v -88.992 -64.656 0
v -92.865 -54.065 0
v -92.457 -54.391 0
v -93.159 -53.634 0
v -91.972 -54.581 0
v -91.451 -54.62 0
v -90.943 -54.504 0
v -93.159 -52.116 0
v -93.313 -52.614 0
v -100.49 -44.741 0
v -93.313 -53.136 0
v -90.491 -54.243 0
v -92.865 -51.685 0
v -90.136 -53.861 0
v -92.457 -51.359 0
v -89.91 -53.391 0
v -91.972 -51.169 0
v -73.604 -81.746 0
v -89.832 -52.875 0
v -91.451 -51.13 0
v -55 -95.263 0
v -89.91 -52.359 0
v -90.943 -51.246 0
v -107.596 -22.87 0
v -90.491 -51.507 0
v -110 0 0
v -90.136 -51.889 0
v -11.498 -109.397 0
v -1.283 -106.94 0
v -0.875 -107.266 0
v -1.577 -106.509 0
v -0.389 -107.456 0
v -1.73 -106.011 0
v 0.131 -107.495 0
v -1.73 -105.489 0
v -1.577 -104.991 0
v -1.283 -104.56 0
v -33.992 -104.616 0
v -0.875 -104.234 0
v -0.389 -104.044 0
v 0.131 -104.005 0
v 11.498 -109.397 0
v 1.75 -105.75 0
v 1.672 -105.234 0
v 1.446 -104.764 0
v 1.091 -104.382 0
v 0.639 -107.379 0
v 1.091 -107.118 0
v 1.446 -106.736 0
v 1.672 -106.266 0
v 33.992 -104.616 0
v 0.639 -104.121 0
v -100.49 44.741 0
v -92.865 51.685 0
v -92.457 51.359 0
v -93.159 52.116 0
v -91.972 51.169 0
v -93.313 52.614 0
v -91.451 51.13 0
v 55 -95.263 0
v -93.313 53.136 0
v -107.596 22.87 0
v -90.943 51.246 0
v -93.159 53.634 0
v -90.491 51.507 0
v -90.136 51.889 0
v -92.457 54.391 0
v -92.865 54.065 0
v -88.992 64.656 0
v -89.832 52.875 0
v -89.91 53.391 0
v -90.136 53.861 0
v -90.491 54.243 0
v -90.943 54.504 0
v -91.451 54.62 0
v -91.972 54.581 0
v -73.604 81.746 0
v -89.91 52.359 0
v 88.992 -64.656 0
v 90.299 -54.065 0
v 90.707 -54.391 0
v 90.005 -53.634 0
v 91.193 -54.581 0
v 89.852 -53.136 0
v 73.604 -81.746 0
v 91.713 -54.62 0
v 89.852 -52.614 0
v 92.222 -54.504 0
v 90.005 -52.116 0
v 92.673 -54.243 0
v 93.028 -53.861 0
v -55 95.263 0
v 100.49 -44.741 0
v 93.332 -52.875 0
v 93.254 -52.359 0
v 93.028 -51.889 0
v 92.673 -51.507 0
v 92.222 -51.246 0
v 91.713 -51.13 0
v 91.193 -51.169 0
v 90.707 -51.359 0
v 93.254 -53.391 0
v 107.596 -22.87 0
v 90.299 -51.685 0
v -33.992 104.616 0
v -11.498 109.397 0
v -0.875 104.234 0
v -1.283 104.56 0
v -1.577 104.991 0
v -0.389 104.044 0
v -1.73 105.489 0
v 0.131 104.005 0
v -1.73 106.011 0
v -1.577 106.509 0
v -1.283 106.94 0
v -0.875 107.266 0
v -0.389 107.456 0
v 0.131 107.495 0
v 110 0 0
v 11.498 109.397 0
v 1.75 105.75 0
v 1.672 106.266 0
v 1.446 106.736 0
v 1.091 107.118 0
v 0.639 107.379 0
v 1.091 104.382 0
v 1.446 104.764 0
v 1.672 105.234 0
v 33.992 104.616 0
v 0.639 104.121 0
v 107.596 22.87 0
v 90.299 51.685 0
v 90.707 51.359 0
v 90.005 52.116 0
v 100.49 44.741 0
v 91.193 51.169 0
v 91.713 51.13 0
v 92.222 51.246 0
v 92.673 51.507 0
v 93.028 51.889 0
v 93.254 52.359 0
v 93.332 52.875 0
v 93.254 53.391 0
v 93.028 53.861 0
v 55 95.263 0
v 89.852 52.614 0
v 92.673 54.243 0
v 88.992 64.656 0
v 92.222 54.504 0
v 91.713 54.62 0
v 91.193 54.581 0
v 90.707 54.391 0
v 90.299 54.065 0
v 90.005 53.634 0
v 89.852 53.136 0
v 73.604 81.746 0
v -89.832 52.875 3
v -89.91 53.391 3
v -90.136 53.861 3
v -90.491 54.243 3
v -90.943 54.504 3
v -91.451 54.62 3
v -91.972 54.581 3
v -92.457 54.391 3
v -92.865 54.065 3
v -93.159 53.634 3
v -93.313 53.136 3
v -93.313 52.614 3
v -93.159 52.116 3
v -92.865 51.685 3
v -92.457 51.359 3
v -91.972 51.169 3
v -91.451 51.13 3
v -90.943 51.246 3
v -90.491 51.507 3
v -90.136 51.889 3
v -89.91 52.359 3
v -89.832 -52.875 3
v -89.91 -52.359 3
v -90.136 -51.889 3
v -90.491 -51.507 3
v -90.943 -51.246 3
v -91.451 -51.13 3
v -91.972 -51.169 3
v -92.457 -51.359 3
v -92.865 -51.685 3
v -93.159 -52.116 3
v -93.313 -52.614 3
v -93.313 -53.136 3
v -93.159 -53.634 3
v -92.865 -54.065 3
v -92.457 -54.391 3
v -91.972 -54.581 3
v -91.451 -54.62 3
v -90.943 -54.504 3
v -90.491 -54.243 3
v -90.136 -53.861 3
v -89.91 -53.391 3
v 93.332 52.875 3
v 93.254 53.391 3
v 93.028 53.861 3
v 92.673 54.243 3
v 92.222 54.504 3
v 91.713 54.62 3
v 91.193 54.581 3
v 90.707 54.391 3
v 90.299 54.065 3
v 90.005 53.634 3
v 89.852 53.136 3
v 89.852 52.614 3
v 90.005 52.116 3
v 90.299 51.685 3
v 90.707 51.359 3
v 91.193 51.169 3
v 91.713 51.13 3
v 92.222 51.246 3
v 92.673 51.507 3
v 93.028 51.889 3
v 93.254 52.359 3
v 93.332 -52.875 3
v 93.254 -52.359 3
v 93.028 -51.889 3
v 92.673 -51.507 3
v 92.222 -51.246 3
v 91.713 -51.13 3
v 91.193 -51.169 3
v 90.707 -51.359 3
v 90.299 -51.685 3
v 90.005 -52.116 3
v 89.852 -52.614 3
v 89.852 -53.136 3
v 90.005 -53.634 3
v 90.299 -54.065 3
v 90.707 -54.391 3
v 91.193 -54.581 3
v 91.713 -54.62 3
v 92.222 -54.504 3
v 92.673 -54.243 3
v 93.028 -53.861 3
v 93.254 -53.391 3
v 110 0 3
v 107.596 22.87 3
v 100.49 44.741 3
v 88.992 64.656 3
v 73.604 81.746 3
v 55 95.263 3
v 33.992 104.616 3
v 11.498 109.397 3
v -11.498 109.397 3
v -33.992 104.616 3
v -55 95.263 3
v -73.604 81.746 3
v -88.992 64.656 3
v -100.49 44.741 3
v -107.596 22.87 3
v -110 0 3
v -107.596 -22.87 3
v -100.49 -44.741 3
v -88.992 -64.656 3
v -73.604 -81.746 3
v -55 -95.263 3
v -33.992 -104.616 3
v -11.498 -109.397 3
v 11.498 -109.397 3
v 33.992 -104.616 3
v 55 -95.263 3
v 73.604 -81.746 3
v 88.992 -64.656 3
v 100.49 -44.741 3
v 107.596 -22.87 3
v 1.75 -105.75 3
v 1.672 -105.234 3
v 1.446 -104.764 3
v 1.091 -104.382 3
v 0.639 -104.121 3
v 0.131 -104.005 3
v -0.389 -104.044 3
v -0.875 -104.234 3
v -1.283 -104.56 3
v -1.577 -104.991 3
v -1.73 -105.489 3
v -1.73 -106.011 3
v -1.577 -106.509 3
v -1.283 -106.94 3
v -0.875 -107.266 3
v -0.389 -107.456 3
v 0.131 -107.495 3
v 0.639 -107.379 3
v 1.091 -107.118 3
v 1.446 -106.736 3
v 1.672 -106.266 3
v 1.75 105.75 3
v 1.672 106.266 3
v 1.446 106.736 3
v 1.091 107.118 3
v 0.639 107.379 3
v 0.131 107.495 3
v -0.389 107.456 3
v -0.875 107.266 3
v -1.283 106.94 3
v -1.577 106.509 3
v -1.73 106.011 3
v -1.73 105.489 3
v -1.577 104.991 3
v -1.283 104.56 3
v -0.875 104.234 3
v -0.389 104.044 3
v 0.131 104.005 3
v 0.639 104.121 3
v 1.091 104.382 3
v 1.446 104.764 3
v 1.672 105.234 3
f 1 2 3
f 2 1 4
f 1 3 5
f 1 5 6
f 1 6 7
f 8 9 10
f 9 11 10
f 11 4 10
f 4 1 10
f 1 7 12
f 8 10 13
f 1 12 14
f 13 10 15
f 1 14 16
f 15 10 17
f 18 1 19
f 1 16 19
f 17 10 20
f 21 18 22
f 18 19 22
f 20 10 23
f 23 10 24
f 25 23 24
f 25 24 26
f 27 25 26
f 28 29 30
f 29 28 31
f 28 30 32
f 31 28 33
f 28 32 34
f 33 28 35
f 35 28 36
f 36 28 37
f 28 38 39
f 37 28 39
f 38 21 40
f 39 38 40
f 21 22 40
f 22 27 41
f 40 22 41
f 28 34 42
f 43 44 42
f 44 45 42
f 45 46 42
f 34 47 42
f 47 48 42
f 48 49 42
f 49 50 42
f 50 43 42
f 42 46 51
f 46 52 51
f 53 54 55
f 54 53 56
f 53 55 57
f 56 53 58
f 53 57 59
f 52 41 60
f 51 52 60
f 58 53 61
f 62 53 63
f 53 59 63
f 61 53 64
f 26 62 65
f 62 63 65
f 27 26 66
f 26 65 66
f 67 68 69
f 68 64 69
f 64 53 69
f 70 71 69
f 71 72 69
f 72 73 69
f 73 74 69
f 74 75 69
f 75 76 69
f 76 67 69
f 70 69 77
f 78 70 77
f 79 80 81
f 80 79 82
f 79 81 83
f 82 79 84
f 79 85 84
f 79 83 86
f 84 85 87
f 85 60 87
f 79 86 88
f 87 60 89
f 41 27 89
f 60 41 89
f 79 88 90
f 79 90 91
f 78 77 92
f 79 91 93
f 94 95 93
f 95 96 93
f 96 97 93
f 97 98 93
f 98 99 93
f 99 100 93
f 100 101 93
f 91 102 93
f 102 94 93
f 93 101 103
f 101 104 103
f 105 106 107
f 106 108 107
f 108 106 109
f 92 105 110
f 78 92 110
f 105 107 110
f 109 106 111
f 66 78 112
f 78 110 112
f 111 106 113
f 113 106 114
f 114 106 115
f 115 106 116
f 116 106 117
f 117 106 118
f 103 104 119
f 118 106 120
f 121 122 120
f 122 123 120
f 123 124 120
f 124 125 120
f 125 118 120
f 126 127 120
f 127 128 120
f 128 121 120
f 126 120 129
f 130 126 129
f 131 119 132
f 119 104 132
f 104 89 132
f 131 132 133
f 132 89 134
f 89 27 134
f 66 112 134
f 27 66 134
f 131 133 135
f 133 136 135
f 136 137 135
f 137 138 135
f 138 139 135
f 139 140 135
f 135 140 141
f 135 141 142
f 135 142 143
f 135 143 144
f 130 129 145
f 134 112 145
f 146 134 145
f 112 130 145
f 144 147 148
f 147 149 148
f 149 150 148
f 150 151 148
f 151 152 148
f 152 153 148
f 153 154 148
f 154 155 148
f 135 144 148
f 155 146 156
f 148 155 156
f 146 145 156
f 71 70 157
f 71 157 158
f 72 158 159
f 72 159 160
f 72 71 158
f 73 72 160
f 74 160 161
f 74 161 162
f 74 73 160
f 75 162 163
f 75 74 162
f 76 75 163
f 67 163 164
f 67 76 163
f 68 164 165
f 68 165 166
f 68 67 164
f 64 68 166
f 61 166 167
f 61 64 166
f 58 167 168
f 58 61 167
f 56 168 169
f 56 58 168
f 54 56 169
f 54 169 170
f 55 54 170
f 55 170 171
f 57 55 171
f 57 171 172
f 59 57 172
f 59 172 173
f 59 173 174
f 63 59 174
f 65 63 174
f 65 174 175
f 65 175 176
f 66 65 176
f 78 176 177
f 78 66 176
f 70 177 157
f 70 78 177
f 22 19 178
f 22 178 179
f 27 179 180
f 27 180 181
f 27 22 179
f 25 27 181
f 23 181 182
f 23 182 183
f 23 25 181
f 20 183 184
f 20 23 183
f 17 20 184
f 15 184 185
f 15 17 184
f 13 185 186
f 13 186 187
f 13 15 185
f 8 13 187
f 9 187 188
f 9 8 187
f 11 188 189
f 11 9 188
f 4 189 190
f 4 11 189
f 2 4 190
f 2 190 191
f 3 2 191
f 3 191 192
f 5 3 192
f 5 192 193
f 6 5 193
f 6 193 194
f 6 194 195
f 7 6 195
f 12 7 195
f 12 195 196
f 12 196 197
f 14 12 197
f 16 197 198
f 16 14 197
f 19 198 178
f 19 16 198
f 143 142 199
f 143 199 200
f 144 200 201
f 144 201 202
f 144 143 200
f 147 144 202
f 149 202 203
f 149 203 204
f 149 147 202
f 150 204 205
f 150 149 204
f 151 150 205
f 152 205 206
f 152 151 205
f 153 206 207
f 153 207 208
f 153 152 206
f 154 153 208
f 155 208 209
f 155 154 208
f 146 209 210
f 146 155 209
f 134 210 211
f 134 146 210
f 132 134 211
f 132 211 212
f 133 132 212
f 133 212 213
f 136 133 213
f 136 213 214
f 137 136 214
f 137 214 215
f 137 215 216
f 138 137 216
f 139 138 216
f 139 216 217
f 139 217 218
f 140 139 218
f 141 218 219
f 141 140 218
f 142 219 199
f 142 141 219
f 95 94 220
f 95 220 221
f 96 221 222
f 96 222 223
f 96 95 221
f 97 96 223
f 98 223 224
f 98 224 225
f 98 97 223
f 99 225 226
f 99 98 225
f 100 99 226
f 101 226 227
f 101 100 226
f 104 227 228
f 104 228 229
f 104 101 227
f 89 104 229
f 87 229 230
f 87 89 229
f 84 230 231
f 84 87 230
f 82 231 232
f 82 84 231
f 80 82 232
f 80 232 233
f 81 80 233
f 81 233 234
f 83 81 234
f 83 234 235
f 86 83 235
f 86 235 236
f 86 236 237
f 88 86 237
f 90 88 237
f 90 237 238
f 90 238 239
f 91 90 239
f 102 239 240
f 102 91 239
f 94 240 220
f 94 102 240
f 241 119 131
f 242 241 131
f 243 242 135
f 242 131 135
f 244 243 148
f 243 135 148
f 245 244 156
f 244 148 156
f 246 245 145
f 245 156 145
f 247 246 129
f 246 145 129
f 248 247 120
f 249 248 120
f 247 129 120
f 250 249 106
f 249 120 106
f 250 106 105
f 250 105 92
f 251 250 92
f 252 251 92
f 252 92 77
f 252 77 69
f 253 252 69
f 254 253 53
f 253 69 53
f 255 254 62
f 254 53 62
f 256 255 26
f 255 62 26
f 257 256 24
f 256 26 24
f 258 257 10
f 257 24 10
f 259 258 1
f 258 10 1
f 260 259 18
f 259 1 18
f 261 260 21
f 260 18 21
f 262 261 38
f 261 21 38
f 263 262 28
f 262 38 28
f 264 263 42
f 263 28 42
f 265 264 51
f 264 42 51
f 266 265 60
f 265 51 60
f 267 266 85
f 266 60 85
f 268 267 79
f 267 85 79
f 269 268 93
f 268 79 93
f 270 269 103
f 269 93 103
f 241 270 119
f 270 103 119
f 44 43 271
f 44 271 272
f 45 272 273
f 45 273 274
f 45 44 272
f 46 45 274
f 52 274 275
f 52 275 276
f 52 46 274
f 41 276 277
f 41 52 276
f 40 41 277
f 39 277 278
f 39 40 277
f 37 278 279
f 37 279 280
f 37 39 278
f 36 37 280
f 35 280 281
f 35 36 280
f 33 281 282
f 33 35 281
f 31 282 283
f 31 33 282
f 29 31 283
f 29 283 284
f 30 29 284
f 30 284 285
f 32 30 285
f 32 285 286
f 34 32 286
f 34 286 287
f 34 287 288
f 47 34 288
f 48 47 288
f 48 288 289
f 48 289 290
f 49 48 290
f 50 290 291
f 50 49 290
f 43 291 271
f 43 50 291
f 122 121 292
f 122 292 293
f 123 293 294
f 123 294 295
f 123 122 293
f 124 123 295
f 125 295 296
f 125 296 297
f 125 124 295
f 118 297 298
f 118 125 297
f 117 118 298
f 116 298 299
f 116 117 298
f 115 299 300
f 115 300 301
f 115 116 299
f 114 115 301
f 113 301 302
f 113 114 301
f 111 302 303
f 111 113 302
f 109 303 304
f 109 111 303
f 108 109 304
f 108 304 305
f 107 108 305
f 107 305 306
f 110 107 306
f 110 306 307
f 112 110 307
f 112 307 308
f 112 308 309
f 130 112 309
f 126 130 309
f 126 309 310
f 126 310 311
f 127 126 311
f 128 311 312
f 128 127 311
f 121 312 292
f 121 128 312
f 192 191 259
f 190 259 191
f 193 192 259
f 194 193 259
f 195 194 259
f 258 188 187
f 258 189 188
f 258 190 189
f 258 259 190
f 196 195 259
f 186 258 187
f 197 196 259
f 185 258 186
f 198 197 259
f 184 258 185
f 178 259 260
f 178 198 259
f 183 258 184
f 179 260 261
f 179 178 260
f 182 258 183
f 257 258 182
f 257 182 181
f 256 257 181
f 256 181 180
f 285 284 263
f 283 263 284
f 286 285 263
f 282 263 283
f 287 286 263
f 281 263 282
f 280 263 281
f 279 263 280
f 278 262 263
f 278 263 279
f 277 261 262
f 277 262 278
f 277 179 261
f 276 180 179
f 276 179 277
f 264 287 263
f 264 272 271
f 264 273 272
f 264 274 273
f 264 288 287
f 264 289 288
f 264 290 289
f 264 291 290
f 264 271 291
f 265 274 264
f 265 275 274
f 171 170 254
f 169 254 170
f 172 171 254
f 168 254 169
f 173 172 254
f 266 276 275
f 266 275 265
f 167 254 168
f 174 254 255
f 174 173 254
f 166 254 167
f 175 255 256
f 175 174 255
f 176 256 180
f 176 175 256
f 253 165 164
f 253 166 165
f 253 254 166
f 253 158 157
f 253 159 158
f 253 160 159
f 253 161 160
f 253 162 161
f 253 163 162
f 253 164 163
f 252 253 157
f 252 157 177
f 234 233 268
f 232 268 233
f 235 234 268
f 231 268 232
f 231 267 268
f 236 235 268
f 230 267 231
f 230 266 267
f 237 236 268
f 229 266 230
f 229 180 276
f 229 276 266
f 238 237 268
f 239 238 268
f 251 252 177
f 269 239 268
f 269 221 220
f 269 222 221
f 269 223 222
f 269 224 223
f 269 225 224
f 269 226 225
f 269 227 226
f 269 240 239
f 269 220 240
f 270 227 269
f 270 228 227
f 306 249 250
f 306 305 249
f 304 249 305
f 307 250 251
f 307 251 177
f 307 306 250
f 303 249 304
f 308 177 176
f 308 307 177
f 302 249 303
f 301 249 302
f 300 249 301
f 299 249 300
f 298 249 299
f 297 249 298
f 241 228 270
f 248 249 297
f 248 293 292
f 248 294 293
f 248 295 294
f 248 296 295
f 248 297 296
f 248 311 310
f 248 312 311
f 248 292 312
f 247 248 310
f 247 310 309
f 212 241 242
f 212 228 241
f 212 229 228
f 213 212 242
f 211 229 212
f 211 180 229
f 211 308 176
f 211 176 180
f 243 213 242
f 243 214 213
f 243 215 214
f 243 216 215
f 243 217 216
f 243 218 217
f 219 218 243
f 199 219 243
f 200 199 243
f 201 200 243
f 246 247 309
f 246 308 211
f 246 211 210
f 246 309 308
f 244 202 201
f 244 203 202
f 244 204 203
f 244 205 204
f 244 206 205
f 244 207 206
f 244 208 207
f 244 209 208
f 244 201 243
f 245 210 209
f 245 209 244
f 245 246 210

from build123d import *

# Parameters (mm, degrees)
F0_R     = 110
F0_R_2   = 1.75
F1_DEPTH = 3


with BuildPart() as f1:
    # F0 (on Top) → F1 (new body)
    with BuildSketch(Plane.XY):
        Circle(F0_R)
        with Locations((-91.582186, -52.875)):
            Circle(F0_R_2, mode=Mode.SUBTRACT)
        with Locations((0, -105.75)):
            Circle(F0_R_2, mode=Mode.SUBTRACT)
        with Locations((91.582186, -52.875)):
            Circle(F0_R_2, mode=Mode.SUBTRACT)
        with Locations((-91.582186, 52.875)):
            Circle(F0_R_2, mode=Mode.SUBTRACT)
        with Locations((91.582186, 52.875)):
            Circle(F0_R_2, mode=Mode.SUBTRACT)
        with Locations((0, 105.75)):
            Circle(F0_R_2, mode=Mode.SUBTRACT)
    extrude(amount=F1_DEPTH)


solid = f1.part
